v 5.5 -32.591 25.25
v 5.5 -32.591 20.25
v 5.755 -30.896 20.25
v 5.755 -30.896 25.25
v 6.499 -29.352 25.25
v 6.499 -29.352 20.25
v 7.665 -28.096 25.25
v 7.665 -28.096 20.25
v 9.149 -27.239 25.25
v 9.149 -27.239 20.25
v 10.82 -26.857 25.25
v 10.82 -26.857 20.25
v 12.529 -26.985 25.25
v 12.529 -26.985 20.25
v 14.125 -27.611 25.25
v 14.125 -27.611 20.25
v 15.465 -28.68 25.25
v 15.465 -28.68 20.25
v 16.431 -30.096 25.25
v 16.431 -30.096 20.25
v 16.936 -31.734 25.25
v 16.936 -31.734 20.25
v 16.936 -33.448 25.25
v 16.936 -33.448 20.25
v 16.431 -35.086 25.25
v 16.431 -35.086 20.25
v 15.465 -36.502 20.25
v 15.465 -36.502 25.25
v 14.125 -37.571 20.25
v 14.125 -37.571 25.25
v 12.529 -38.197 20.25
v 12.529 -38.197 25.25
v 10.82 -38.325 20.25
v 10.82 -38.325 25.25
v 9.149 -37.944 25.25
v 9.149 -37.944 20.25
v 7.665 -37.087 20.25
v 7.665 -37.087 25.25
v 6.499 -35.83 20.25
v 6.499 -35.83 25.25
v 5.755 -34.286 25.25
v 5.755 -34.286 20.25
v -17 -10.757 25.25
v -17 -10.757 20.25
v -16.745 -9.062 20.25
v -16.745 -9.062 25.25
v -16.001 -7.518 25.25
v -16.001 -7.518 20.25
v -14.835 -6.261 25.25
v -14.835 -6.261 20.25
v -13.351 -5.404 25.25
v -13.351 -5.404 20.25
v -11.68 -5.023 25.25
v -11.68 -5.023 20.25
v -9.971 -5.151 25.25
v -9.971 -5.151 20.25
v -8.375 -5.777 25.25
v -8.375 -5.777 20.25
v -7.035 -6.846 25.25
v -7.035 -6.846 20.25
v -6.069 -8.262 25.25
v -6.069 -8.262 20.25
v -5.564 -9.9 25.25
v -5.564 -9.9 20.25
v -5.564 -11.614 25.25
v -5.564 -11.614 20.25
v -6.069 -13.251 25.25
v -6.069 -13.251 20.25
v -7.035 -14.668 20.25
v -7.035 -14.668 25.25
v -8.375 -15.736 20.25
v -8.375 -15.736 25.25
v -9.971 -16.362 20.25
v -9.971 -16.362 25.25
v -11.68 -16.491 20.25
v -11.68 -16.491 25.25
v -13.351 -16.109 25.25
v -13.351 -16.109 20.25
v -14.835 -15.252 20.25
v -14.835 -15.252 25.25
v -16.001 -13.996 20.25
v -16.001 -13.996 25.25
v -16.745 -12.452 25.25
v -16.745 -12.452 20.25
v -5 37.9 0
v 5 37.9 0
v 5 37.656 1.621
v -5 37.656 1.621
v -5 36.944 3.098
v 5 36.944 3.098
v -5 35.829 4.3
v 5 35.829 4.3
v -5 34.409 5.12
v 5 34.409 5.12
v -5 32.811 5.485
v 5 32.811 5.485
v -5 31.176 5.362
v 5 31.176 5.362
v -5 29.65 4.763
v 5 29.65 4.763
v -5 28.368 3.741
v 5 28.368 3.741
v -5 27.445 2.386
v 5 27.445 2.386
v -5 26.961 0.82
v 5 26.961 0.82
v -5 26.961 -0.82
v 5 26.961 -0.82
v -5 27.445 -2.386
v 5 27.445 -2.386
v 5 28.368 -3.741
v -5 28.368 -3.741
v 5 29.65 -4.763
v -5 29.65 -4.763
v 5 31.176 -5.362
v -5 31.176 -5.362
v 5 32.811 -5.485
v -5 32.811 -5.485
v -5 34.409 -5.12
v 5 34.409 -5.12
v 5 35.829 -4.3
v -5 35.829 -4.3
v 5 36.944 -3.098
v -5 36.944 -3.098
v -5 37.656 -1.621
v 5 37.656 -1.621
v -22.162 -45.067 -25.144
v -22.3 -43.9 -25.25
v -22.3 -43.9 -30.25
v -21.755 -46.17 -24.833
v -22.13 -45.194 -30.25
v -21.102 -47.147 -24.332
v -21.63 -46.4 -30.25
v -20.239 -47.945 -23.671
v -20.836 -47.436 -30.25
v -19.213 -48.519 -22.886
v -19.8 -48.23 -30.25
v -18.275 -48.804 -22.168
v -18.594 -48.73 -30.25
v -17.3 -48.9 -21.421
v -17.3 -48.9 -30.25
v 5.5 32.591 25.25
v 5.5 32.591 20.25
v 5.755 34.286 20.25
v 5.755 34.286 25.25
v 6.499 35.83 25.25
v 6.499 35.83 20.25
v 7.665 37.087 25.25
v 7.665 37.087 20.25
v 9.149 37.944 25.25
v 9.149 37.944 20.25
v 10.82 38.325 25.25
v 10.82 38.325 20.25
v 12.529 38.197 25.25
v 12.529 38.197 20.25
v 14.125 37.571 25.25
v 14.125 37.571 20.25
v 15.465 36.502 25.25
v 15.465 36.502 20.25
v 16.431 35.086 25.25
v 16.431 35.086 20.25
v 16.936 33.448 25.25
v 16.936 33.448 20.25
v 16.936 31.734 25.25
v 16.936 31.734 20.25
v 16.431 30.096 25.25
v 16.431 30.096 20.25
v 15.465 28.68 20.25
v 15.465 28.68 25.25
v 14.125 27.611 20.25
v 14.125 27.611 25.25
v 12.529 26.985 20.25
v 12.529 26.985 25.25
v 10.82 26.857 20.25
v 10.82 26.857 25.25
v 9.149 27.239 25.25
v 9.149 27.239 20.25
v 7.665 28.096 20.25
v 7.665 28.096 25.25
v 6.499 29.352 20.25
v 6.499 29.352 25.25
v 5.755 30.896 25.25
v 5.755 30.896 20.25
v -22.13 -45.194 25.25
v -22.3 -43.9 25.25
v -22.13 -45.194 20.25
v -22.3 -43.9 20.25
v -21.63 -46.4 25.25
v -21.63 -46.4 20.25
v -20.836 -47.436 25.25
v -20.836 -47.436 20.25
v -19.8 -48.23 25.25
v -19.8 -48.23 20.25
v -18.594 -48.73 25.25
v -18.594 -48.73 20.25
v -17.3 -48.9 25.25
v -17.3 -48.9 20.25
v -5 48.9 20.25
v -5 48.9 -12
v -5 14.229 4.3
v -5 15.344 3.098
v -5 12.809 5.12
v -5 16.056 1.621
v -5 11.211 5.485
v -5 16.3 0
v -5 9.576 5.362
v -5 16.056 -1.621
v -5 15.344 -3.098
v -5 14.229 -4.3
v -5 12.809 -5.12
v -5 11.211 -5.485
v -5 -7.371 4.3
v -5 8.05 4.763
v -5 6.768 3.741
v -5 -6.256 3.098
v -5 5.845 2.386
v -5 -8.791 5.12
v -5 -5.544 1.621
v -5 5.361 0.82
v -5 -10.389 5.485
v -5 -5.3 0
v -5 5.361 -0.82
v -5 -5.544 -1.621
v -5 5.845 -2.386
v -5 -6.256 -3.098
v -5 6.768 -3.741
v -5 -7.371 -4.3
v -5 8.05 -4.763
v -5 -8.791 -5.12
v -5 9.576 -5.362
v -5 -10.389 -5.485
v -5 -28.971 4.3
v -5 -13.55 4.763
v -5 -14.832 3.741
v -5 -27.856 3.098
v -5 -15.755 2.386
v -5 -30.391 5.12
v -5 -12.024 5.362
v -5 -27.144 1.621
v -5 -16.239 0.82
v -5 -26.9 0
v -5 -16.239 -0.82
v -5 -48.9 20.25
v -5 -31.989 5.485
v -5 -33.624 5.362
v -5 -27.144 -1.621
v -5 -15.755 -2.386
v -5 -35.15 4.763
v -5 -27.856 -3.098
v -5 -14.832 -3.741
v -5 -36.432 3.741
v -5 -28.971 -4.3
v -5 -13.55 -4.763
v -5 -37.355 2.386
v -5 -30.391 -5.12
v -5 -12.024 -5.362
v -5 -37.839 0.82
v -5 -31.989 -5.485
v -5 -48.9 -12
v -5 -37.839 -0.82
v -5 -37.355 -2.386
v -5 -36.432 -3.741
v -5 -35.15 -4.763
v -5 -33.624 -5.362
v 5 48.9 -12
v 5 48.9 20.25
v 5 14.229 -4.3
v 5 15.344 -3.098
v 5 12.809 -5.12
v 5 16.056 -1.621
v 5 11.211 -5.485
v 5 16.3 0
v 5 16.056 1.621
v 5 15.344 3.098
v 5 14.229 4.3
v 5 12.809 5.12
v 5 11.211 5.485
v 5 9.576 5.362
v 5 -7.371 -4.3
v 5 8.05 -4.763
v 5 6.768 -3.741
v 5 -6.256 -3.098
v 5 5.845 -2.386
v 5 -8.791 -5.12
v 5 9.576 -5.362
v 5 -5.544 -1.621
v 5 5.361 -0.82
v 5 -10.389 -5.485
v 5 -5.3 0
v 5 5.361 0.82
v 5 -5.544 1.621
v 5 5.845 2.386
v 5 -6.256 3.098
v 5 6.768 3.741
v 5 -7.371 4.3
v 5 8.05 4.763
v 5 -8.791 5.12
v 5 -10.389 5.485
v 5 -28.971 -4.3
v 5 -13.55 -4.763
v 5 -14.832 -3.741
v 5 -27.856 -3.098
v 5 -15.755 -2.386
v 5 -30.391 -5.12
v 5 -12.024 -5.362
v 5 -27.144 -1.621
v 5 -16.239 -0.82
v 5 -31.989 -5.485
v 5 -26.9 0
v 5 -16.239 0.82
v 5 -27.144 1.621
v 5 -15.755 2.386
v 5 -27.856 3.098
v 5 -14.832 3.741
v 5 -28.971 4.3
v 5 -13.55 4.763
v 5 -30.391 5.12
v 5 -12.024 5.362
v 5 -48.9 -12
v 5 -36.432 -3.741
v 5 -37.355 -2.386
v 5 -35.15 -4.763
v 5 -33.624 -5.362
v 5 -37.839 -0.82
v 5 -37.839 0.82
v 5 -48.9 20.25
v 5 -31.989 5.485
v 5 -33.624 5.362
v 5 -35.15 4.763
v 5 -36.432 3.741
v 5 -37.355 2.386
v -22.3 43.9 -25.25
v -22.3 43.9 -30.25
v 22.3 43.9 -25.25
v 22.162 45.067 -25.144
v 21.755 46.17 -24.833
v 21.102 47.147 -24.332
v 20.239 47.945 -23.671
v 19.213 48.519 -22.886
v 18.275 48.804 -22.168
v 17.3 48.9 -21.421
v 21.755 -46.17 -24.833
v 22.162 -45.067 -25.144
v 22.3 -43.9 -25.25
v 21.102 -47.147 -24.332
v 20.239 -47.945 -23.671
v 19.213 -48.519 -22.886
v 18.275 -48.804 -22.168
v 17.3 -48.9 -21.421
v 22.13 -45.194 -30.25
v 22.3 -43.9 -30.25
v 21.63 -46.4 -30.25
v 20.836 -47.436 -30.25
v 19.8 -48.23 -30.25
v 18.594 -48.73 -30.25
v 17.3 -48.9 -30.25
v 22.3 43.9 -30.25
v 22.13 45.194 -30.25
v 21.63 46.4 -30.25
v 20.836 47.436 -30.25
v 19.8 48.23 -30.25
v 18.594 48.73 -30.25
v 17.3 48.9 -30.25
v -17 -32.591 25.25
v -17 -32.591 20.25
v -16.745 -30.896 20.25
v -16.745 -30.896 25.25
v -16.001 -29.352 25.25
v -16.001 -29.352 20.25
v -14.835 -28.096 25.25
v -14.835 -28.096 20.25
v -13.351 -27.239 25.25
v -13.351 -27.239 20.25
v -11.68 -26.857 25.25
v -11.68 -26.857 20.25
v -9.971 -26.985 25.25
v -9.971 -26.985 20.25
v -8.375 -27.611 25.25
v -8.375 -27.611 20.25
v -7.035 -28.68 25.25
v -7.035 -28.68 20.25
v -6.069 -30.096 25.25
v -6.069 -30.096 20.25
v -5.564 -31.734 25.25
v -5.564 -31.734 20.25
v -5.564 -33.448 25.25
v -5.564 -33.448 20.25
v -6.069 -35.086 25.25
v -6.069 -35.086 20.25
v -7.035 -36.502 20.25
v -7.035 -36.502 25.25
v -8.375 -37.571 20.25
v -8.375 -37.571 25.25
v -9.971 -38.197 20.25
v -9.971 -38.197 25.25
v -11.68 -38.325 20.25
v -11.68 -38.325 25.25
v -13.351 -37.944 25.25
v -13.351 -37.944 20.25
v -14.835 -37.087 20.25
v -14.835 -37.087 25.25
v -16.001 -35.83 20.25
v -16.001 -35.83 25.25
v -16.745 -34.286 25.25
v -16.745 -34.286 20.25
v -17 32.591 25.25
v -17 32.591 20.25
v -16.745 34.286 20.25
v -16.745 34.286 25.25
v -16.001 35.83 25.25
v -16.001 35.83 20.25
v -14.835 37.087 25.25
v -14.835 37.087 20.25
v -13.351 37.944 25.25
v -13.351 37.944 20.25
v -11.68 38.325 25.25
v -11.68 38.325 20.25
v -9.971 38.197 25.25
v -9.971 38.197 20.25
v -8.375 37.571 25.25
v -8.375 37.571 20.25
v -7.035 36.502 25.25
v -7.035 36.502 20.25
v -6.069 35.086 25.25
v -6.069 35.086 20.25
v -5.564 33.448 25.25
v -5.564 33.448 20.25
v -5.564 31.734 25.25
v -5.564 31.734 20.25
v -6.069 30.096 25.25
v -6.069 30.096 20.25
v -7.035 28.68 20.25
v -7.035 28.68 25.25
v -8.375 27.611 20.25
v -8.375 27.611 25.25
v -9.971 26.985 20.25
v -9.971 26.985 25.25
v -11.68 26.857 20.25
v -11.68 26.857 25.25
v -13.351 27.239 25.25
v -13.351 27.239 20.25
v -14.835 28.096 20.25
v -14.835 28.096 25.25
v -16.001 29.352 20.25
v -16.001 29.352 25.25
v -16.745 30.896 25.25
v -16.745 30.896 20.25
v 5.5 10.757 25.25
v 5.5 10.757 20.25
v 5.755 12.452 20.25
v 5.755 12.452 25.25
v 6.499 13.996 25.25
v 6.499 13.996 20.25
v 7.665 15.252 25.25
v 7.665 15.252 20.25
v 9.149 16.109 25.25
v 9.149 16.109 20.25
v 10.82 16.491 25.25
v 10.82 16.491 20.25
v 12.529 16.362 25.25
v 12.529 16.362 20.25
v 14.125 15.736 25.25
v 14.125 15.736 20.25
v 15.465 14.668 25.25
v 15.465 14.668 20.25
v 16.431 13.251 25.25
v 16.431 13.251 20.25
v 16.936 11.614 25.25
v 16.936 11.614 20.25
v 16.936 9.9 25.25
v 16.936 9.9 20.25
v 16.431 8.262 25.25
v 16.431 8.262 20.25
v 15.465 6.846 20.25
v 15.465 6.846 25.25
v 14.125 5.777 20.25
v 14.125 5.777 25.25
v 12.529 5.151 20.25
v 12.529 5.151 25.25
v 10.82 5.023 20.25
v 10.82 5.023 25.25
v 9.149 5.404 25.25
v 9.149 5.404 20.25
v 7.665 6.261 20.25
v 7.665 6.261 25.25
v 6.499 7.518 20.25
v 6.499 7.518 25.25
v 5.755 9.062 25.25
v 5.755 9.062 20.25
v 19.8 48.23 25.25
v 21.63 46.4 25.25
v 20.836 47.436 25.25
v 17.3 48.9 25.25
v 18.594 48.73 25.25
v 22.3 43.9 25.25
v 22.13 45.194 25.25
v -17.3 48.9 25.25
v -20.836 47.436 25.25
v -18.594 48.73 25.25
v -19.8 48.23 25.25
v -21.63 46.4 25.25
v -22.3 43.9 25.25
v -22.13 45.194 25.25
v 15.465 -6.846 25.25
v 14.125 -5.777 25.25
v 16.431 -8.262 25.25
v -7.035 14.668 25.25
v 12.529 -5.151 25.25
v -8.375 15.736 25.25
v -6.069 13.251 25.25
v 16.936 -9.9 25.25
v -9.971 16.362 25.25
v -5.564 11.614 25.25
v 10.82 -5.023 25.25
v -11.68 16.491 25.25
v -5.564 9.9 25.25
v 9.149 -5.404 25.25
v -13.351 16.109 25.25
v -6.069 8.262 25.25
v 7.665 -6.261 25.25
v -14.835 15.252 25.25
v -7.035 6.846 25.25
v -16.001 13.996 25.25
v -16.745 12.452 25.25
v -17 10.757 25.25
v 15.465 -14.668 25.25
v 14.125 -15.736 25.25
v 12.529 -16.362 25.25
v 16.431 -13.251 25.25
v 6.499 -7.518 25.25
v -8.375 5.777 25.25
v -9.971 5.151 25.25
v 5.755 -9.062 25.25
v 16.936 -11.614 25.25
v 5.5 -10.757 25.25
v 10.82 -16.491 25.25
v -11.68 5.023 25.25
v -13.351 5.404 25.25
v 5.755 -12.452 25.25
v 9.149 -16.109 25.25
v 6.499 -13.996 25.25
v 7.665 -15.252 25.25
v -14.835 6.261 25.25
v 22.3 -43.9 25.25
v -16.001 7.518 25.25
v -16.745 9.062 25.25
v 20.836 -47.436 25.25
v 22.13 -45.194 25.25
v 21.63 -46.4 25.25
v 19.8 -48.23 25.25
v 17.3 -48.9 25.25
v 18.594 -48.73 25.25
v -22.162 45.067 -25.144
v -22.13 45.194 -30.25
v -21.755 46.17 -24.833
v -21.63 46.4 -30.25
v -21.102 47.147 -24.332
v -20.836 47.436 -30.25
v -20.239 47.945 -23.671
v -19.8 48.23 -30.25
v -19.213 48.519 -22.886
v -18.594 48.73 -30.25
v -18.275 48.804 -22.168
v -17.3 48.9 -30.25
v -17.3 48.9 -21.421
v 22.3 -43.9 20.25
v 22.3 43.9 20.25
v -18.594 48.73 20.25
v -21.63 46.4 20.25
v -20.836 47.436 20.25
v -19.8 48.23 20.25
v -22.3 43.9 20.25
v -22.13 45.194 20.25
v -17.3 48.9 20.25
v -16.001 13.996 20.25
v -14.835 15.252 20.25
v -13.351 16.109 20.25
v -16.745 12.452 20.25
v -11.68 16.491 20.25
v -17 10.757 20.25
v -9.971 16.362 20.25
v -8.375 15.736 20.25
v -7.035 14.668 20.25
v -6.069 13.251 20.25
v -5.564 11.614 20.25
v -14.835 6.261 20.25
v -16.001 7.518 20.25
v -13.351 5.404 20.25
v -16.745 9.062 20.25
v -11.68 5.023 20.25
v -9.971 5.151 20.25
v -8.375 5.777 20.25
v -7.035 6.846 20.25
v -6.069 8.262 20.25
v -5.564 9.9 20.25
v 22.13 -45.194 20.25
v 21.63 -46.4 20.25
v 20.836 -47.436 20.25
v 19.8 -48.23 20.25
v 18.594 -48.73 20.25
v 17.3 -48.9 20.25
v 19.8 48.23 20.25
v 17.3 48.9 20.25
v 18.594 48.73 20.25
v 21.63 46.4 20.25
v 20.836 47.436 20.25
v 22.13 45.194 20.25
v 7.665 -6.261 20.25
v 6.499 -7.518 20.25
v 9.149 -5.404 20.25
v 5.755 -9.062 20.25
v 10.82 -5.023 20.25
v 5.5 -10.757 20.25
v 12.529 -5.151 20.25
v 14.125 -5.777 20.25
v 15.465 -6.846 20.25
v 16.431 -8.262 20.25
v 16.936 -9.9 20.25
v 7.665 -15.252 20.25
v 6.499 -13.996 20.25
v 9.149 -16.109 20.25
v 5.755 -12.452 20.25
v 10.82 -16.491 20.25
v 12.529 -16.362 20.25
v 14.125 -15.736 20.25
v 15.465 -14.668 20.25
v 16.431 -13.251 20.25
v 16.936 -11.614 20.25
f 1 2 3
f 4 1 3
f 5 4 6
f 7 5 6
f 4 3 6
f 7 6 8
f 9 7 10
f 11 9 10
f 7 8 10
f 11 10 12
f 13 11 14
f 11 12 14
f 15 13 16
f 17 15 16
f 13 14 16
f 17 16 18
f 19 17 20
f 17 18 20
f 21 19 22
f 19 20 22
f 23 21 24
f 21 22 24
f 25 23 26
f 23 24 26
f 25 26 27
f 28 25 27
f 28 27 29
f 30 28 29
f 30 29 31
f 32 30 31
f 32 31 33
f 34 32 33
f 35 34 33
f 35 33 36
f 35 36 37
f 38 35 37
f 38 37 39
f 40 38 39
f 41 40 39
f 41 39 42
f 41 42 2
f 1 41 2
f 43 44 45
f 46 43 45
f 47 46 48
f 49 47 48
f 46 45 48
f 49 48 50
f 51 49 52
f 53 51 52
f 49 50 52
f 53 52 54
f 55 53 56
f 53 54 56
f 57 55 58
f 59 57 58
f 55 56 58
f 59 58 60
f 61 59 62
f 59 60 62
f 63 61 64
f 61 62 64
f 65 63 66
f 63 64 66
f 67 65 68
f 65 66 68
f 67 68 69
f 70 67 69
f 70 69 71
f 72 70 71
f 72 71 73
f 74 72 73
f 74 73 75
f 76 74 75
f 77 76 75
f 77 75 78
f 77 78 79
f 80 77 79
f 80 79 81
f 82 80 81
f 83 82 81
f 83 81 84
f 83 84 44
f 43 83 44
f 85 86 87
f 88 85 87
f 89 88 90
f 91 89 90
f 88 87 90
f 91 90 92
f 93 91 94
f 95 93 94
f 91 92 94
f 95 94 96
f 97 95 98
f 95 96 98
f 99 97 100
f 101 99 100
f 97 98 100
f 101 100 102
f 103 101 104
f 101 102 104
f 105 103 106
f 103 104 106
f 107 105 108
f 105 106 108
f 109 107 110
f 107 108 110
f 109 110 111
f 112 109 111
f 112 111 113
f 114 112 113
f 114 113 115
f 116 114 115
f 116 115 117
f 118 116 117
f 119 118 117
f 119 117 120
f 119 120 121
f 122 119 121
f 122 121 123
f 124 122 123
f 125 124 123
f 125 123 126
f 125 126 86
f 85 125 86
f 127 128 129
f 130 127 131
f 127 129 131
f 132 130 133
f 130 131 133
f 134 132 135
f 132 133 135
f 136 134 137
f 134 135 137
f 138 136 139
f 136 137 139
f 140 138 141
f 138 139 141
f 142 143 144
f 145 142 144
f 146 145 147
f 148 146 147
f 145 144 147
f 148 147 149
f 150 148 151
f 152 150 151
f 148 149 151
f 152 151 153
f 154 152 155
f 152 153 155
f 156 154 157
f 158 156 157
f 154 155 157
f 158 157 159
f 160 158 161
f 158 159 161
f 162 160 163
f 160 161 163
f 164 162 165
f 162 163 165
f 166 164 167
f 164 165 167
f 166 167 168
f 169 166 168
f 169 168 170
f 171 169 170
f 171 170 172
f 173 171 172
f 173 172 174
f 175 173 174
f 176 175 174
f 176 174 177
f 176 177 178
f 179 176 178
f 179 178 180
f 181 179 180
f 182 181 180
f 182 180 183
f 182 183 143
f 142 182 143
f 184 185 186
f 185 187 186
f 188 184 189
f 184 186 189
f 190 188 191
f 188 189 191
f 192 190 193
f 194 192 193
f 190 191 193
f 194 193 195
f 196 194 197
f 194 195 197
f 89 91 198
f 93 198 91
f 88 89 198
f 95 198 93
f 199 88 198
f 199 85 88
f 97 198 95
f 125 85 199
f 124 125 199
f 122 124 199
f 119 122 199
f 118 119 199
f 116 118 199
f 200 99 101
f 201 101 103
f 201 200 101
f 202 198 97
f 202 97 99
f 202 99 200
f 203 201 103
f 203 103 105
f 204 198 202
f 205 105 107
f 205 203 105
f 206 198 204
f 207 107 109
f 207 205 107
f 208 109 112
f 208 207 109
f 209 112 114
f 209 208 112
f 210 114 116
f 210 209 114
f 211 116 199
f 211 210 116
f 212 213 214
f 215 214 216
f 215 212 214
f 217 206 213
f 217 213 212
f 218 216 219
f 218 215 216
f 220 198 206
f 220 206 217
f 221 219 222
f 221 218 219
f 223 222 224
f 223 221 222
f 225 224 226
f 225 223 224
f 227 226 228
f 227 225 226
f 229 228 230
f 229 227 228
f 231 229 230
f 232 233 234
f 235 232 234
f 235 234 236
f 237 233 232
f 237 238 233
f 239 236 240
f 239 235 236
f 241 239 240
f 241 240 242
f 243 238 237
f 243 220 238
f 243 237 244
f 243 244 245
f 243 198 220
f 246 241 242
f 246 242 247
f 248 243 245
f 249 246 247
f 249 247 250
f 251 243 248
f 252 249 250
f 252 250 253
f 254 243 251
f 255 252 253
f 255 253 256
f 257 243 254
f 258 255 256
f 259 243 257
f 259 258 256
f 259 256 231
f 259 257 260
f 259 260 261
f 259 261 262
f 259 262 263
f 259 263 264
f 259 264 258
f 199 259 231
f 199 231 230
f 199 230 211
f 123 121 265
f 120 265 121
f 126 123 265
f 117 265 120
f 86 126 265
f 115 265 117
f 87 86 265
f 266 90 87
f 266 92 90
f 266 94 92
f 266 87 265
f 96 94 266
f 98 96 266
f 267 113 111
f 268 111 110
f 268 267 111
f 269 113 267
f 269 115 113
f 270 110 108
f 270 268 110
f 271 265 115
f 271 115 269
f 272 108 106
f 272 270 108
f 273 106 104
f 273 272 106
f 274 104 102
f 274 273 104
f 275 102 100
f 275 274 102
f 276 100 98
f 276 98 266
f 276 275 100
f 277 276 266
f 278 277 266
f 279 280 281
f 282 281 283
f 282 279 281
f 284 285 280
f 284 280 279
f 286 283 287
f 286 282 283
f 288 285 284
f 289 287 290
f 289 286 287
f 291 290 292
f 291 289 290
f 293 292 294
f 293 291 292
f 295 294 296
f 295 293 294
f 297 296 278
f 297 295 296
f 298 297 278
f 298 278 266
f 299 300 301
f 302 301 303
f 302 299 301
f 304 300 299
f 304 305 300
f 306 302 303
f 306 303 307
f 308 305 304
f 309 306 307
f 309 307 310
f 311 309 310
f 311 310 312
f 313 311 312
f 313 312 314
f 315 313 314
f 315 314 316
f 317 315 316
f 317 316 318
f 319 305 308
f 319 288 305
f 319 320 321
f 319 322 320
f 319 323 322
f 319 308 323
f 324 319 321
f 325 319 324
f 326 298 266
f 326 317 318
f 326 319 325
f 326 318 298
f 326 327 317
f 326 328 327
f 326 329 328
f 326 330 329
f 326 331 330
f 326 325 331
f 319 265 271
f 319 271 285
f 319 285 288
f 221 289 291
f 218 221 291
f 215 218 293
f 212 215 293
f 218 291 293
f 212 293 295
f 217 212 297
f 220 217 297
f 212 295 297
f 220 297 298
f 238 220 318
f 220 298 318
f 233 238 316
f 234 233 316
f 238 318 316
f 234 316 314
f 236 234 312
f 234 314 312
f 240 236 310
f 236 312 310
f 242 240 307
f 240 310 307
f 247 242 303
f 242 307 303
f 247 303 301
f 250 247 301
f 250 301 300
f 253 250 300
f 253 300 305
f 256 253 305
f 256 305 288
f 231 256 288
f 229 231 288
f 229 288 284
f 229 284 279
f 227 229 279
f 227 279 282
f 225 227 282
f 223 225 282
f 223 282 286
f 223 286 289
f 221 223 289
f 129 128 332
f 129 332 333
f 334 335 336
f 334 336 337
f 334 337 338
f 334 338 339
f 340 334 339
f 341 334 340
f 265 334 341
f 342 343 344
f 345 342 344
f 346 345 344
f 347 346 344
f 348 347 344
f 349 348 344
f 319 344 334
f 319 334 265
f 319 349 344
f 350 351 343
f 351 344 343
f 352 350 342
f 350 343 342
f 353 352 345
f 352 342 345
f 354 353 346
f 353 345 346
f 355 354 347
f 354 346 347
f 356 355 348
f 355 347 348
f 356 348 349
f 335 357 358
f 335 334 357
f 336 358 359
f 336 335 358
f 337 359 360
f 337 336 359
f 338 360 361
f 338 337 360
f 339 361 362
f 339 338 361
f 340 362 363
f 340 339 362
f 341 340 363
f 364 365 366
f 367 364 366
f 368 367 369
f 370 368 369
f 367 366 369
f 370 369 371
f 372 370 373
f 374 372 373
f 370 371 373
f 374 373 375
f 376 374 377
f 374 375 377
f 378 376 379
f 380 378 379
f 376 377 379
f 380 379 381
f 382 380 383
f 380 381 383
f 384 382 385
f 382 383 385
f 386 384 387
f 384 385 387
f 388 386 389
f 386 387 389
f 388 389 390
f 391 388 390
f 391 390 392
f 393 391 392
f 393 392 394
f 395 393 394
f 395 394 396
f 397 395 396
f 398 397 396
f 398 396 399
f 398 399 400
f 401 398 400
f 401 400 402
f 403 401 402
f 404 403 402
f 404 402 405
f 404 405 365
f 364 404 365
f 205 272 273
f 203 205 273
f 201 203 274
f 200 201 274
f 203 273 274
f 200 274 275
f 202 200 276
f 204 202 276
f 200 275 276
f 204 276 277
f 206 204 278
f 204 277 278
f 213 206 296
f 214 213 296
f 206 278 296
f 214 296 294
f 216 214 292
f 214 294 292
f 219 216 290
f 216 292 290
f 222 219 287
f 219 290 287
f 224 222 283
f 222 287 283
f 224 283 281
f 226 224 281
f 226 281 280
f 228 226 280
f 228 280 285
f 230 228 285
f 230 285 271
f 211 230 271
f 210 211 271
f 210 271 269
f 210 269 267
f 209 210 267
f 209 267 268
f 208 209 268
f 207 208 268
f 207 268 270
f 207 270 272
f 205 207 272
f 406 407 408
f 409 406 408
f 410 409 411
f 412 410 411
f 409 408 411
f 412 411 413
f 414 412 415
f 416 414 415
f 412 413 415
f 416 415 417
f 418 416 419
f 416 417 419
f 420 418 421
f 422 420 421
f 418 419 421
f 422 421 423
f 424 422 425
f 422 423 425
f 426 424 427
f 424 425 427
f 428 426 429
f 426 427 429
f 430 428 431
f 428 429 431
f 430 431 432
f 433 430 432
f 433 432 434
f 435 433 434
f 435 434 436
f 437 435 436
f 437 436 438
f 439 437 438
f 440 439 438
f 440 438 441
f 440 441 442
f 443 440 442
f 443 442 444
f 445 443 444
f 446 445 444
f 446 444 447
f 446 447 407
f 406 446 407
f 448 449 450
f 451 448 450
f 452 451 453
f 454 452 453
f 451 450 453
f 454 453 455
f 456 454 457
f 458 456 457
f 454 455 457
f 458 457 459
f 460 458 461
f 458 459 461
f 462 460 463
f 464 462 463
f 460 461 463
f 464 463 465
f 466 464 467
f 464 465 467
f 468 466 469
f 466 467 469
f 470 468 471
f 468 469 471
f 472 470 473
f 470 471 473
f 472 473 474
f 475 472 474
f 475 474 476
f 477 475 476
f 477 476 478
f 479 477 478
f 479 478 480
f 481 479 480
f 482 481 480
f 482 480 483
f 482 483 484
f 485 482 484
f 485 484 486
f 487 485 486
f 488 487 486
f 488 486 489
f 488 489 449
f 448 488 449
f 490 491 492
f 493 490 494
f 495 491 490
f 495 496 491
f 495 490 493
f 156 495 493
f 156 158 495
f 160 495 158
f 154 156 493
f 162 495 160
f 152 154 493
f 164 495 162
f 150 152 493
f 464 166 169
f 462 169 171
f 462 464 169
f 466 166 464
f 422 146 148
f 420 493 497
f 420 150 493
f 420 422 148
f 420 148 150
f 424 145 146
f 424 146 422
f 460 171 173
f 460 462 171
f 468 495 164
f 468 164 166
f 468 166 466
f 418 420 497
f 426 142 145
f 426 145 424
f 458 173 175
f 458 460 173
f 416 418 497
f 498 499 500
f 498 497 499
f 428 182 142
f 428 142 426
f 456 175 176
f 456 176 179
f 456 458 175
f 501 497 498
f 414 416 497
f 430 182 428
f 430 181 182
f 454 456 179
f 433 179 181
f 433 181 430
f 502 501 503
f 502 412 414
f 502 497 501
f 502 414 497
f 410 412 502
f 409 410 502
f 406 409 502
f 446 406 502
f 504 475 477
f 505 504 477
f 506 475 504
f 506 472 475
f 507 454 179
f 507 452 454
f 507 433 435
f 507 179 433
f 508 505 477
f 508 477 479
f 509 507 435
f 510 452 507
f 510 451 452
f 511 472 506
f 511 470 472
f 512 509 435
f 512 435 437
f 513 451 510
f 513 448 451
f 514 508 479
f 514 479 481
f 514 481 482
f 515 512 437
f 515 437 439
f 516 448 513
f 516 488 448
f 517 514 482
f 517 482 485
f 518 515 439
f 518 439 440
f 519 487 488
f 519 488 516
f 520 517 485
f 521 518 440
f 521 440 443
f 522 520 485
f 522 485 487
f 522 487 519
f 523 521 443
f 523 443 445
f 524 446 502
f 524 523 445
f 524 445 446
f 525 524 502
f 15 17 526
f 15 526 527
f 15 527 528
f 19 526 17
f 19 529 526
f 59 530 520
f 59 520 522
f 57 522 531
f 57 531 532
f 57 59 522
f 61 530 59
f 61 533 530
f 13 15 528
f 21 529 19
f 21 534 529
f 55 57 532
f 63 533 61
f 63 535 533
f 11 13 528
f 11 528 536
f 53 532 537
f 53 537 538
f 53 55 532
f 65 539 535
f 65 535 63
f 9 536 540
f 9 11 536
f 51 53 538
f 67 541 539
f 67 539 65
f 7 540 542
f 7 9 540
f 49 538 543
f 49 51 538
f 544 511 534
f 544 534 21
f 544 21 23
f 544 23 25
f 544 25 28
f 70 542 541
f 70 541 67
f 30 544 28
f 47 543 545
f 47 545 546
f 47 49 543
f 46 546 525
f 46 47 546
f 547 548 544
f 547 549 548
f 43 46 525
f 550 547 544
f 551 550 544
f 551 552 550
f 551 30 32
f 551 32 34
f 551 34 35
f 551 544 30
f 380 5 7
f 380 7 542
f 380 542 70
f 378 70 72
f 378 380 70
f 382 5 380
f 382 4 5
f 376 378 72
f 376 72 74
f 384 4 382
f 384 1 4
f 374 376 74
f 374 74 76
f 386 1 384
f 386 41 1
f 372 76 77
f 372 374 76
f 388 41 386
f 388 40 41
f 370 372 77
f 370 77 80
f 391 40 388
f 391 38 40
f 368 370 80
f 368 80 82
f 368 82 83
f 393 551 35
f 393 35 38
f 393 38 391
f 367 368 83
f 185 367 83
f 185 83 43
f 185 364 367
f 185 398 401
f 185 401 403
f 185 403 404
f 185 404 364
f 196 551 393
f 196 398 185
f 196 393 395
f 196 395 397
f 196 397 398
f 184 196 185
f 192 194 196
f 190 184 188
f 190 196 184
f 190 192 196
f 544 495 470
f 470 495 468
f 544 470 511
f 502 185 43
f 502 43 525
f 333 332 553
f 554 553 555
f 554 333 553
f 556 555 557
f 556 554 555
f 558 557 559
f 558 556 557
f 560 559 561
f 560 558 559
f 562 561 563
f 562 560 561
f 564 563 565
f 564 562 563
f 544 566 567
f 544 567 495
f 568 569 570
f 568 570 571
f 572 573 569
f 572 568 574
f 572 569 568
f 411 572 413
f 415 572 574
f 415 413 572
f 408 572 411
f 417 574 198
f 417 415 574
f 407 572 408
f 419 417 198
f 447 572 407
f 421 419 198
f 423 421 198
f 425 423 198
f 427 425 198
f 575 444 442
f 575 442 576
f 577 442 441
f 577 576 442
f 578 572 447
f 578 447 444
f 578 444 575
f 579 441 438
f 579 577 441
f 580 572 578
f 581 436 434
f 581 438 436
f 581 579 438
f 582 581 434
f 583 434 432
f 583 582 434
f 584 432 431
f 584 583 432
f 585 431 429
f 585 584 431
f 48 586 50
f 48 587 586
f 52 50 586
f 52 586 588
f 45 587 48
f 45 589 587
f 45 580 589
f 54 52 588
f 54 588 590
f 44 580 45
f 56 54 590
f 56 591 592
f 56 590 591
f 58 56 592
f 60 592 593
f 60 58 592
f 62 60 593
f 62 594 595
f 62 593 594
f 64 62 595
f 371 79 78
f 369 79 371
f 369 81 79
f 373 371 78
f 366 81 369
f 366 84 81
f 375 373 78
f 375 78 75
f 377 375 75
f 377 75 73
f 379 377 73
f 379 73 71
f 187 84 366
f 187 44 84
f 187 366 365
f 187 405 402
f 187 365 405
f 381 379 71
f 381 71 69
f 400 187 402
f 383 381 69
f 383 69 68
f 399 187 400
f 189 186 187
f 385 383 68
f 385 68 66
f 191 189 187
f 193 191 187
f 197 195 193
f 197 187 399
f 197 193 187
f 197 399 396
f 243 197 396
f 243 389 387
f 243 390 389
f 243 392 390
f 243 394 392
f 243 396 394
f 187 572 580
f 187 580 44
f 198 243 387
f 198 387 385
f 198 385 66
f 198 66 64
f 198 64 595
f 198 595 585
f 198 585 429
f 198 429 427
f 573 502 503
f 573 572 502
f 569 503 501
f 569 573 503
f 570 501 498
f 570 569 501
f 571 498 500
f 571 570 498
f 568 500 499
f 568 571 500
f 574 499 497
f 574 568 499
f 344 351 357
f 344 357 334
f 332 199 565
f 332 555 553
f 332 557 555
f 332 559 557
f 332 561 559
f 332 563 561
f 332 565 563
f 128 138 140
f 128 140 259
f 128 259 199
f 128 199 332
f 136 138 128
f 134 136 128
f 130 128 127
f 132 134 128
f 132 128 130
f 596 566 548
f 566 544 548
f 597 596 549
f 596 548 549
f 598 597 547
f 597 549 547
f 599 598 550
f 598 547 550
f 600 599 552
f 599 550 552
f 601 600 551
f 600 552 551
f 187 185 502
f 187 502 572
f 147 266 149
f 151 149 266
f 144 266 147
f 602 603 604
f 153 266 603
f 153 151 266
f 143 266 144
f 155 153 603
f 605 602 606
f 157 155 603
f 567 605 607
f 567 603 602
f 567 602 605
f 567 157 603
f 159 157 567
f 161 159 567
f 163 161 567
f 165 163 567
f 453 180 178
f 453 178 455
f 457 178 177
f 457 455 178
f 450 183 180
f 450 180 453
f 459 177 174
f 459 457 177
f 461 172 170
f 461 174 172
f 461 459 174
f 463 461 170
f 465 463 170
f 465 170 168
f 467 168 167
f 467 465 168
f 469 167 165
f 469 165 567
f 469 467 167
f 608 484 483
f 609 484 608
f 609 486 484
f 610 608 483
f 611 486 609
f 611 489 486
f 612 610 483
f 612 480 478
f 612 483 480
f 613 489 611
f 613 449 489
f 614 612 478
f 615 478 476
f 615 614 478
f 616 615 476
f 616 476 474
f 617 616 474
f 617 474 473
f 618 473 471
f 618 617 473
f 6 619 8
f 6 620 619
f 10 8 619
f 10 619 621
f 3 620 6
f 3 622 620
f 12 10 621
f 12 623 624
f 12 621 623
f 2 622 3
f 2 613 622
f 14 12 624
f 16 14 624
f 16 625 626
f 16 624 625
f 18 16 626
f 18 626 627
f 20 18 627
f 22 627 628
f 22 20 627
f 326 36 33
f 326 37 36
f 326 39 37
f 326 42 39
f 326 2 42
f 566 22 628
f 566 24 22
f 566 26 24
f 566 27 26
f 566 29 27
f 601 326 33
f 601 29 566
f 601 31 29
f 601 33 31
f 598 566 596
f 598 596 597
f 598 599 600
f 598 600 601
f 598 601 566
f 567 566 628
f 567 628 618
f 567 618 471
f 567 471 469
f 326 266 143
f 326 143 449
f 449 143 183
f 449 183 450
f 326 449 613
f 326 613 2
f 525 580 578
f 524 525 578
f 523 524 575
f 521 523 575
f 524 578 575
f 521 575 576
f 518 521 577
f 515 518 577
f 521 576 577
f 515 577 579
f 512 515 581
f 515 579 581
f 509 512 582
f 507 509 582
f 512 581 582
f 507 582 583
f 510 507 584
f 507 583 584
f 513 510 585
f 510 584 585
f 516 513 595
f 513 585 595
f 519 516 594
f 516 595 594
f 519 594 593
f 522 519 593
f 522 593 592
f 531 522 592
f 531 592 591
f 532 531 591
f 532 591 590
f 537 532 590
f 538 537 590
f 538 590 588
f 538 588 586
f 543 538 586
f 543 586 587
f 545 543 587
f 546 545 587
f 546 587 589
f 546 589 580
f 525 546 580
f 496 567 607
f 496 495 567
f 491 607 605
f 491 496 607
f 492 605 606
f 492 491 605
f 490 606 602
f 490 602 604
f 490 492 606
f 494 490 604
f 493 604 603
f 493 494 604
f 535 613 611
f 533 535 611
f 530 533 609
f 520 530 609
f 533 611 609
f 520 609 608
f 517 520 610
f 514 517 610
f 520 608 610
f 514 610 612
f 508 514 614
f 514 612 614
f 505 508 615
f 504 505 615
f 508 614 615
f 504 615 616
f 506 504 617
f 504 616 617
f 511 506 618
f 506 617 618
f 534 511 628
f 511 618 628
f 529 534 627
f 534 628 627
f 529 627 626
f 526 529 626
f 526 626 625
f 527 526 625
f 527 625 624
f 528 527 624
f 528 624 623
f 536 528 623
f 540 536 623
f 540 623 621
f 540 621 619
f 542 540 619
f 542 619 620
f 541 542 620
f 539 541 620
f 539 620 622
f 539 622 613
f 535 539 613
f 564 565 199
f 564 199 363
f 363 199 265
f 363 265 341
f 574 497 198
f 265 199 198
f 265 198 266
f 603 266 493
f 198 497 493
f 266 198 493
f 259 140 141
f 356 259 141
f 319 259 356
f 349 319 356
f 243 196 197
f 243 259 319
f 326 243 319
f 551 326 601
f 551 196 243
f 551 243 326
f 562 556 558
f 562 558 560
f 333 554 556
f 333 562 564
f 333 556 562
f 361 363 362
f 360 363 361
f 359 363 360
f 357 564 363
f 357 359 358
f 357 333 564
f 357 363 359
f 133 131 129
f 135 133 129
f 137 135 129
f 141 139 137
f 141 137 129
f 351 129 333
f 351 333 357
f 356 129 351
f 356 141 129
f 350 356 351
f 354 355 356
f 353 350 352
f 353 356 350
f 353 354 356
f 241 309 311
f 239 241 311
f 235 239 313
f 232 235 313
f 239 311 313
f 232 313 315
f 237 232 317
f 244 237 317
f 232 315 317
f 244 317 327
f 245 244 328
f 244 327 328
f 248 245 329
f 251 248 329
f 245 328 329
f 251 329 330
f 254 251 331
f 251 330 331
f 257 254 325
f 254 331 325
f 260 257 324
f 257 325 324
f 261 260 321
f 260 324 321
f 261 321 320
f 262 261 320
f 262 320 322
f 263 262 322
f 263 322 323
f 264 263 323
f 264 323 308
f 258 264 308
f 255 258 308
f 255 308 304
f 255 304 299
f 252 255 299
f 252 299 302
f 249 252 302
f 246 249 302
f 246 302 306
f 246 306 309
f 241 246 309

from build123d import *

# Parameters (mm, degrees)
F1_DEPTH = 48.9
F3_R     = 5
F5_D     = 11
F7_D     = 11.5
F7_DEPTH = 12
F7_TIP   = 3.4549485594


# Not quite as in the source:
# - a feature names something its author has since deleted; it is built from what else it names


with BuildPart() as f1:
    # F0 (on Front) → F1 (new body, symmetric)
    with BuildSketch(Plane.XZ):
        Polygon((-5, 20.25), (5, 20.25), (22.3, 20.25), (22.3, 25.25), (-22.3, 25.25), (-22.3, 20.25), align=None)
        Polygon((5, 0), (5, 20.25), (-5, 20.25), (-5, -12), (-5, -20.25), (0, -20.25), (5, -20.25), (5, -12), align=None)
        Polygon((-5, -20.25), (-5, -12), (-22.3, -25.25), (-22.3, -30.25), (22.3, -30.25), (22.3, -25.25), (5, -12), (5, -20.25), (0, -20.25), align=None)
    extrude(amount=F1_DEPTH, both=True)

    # F3
    f3_edges = [f1.edges().sort_by_distance(p)[0] for p in [
        (-22.3, 48.9, 22.75),
        (-22.3, -48.9, 22.75),
        (22.3, 48.9, 22.75),
        (22.3, -48.9, 22.75),
        (-22.3, -48.9, -27.75),
        (22.3, -48.9, -27.75),
        (-22.3, 48.9, -27.75),
        (22.3, 48.9, -27.75),
    ]]
    fillet(f3_edges, radius=F3_R)

    # F5 (through all)
    with Locations(Plane(origin=(-5, 0, 0), x_dir=(0, -1, 0), z_dir=(-1, 0, 0))):
        with Locations((32.4, 0), (10.8, 0), (-10.8, 0), (-32.4, 0)):
            Hole(F5_D / 2)

    # F7
    with Locations(Plane.XY.offset(25.25)):
        with Locations((-11.25, 32.5910784304), (11.25, 32.5910784304), (11.25, 10.7566630468), (-11.25, 10.7566630468), (-11.25, -10.7566630468), (11.25, -10.7566630468), (11.25, -32.5910784304), (-11.25, -32.5910784304)):
            Hole(F7_D / 2, depth=F7_DEPTH)
            with Locations((0, 0, -(F7_DEPTH + F7_TIP / 2))):  # 118° drill point
                Cone(0, F7_D / 2, F7_TIP, mode=Mode.SUBTRACT)


solid = f1.part
